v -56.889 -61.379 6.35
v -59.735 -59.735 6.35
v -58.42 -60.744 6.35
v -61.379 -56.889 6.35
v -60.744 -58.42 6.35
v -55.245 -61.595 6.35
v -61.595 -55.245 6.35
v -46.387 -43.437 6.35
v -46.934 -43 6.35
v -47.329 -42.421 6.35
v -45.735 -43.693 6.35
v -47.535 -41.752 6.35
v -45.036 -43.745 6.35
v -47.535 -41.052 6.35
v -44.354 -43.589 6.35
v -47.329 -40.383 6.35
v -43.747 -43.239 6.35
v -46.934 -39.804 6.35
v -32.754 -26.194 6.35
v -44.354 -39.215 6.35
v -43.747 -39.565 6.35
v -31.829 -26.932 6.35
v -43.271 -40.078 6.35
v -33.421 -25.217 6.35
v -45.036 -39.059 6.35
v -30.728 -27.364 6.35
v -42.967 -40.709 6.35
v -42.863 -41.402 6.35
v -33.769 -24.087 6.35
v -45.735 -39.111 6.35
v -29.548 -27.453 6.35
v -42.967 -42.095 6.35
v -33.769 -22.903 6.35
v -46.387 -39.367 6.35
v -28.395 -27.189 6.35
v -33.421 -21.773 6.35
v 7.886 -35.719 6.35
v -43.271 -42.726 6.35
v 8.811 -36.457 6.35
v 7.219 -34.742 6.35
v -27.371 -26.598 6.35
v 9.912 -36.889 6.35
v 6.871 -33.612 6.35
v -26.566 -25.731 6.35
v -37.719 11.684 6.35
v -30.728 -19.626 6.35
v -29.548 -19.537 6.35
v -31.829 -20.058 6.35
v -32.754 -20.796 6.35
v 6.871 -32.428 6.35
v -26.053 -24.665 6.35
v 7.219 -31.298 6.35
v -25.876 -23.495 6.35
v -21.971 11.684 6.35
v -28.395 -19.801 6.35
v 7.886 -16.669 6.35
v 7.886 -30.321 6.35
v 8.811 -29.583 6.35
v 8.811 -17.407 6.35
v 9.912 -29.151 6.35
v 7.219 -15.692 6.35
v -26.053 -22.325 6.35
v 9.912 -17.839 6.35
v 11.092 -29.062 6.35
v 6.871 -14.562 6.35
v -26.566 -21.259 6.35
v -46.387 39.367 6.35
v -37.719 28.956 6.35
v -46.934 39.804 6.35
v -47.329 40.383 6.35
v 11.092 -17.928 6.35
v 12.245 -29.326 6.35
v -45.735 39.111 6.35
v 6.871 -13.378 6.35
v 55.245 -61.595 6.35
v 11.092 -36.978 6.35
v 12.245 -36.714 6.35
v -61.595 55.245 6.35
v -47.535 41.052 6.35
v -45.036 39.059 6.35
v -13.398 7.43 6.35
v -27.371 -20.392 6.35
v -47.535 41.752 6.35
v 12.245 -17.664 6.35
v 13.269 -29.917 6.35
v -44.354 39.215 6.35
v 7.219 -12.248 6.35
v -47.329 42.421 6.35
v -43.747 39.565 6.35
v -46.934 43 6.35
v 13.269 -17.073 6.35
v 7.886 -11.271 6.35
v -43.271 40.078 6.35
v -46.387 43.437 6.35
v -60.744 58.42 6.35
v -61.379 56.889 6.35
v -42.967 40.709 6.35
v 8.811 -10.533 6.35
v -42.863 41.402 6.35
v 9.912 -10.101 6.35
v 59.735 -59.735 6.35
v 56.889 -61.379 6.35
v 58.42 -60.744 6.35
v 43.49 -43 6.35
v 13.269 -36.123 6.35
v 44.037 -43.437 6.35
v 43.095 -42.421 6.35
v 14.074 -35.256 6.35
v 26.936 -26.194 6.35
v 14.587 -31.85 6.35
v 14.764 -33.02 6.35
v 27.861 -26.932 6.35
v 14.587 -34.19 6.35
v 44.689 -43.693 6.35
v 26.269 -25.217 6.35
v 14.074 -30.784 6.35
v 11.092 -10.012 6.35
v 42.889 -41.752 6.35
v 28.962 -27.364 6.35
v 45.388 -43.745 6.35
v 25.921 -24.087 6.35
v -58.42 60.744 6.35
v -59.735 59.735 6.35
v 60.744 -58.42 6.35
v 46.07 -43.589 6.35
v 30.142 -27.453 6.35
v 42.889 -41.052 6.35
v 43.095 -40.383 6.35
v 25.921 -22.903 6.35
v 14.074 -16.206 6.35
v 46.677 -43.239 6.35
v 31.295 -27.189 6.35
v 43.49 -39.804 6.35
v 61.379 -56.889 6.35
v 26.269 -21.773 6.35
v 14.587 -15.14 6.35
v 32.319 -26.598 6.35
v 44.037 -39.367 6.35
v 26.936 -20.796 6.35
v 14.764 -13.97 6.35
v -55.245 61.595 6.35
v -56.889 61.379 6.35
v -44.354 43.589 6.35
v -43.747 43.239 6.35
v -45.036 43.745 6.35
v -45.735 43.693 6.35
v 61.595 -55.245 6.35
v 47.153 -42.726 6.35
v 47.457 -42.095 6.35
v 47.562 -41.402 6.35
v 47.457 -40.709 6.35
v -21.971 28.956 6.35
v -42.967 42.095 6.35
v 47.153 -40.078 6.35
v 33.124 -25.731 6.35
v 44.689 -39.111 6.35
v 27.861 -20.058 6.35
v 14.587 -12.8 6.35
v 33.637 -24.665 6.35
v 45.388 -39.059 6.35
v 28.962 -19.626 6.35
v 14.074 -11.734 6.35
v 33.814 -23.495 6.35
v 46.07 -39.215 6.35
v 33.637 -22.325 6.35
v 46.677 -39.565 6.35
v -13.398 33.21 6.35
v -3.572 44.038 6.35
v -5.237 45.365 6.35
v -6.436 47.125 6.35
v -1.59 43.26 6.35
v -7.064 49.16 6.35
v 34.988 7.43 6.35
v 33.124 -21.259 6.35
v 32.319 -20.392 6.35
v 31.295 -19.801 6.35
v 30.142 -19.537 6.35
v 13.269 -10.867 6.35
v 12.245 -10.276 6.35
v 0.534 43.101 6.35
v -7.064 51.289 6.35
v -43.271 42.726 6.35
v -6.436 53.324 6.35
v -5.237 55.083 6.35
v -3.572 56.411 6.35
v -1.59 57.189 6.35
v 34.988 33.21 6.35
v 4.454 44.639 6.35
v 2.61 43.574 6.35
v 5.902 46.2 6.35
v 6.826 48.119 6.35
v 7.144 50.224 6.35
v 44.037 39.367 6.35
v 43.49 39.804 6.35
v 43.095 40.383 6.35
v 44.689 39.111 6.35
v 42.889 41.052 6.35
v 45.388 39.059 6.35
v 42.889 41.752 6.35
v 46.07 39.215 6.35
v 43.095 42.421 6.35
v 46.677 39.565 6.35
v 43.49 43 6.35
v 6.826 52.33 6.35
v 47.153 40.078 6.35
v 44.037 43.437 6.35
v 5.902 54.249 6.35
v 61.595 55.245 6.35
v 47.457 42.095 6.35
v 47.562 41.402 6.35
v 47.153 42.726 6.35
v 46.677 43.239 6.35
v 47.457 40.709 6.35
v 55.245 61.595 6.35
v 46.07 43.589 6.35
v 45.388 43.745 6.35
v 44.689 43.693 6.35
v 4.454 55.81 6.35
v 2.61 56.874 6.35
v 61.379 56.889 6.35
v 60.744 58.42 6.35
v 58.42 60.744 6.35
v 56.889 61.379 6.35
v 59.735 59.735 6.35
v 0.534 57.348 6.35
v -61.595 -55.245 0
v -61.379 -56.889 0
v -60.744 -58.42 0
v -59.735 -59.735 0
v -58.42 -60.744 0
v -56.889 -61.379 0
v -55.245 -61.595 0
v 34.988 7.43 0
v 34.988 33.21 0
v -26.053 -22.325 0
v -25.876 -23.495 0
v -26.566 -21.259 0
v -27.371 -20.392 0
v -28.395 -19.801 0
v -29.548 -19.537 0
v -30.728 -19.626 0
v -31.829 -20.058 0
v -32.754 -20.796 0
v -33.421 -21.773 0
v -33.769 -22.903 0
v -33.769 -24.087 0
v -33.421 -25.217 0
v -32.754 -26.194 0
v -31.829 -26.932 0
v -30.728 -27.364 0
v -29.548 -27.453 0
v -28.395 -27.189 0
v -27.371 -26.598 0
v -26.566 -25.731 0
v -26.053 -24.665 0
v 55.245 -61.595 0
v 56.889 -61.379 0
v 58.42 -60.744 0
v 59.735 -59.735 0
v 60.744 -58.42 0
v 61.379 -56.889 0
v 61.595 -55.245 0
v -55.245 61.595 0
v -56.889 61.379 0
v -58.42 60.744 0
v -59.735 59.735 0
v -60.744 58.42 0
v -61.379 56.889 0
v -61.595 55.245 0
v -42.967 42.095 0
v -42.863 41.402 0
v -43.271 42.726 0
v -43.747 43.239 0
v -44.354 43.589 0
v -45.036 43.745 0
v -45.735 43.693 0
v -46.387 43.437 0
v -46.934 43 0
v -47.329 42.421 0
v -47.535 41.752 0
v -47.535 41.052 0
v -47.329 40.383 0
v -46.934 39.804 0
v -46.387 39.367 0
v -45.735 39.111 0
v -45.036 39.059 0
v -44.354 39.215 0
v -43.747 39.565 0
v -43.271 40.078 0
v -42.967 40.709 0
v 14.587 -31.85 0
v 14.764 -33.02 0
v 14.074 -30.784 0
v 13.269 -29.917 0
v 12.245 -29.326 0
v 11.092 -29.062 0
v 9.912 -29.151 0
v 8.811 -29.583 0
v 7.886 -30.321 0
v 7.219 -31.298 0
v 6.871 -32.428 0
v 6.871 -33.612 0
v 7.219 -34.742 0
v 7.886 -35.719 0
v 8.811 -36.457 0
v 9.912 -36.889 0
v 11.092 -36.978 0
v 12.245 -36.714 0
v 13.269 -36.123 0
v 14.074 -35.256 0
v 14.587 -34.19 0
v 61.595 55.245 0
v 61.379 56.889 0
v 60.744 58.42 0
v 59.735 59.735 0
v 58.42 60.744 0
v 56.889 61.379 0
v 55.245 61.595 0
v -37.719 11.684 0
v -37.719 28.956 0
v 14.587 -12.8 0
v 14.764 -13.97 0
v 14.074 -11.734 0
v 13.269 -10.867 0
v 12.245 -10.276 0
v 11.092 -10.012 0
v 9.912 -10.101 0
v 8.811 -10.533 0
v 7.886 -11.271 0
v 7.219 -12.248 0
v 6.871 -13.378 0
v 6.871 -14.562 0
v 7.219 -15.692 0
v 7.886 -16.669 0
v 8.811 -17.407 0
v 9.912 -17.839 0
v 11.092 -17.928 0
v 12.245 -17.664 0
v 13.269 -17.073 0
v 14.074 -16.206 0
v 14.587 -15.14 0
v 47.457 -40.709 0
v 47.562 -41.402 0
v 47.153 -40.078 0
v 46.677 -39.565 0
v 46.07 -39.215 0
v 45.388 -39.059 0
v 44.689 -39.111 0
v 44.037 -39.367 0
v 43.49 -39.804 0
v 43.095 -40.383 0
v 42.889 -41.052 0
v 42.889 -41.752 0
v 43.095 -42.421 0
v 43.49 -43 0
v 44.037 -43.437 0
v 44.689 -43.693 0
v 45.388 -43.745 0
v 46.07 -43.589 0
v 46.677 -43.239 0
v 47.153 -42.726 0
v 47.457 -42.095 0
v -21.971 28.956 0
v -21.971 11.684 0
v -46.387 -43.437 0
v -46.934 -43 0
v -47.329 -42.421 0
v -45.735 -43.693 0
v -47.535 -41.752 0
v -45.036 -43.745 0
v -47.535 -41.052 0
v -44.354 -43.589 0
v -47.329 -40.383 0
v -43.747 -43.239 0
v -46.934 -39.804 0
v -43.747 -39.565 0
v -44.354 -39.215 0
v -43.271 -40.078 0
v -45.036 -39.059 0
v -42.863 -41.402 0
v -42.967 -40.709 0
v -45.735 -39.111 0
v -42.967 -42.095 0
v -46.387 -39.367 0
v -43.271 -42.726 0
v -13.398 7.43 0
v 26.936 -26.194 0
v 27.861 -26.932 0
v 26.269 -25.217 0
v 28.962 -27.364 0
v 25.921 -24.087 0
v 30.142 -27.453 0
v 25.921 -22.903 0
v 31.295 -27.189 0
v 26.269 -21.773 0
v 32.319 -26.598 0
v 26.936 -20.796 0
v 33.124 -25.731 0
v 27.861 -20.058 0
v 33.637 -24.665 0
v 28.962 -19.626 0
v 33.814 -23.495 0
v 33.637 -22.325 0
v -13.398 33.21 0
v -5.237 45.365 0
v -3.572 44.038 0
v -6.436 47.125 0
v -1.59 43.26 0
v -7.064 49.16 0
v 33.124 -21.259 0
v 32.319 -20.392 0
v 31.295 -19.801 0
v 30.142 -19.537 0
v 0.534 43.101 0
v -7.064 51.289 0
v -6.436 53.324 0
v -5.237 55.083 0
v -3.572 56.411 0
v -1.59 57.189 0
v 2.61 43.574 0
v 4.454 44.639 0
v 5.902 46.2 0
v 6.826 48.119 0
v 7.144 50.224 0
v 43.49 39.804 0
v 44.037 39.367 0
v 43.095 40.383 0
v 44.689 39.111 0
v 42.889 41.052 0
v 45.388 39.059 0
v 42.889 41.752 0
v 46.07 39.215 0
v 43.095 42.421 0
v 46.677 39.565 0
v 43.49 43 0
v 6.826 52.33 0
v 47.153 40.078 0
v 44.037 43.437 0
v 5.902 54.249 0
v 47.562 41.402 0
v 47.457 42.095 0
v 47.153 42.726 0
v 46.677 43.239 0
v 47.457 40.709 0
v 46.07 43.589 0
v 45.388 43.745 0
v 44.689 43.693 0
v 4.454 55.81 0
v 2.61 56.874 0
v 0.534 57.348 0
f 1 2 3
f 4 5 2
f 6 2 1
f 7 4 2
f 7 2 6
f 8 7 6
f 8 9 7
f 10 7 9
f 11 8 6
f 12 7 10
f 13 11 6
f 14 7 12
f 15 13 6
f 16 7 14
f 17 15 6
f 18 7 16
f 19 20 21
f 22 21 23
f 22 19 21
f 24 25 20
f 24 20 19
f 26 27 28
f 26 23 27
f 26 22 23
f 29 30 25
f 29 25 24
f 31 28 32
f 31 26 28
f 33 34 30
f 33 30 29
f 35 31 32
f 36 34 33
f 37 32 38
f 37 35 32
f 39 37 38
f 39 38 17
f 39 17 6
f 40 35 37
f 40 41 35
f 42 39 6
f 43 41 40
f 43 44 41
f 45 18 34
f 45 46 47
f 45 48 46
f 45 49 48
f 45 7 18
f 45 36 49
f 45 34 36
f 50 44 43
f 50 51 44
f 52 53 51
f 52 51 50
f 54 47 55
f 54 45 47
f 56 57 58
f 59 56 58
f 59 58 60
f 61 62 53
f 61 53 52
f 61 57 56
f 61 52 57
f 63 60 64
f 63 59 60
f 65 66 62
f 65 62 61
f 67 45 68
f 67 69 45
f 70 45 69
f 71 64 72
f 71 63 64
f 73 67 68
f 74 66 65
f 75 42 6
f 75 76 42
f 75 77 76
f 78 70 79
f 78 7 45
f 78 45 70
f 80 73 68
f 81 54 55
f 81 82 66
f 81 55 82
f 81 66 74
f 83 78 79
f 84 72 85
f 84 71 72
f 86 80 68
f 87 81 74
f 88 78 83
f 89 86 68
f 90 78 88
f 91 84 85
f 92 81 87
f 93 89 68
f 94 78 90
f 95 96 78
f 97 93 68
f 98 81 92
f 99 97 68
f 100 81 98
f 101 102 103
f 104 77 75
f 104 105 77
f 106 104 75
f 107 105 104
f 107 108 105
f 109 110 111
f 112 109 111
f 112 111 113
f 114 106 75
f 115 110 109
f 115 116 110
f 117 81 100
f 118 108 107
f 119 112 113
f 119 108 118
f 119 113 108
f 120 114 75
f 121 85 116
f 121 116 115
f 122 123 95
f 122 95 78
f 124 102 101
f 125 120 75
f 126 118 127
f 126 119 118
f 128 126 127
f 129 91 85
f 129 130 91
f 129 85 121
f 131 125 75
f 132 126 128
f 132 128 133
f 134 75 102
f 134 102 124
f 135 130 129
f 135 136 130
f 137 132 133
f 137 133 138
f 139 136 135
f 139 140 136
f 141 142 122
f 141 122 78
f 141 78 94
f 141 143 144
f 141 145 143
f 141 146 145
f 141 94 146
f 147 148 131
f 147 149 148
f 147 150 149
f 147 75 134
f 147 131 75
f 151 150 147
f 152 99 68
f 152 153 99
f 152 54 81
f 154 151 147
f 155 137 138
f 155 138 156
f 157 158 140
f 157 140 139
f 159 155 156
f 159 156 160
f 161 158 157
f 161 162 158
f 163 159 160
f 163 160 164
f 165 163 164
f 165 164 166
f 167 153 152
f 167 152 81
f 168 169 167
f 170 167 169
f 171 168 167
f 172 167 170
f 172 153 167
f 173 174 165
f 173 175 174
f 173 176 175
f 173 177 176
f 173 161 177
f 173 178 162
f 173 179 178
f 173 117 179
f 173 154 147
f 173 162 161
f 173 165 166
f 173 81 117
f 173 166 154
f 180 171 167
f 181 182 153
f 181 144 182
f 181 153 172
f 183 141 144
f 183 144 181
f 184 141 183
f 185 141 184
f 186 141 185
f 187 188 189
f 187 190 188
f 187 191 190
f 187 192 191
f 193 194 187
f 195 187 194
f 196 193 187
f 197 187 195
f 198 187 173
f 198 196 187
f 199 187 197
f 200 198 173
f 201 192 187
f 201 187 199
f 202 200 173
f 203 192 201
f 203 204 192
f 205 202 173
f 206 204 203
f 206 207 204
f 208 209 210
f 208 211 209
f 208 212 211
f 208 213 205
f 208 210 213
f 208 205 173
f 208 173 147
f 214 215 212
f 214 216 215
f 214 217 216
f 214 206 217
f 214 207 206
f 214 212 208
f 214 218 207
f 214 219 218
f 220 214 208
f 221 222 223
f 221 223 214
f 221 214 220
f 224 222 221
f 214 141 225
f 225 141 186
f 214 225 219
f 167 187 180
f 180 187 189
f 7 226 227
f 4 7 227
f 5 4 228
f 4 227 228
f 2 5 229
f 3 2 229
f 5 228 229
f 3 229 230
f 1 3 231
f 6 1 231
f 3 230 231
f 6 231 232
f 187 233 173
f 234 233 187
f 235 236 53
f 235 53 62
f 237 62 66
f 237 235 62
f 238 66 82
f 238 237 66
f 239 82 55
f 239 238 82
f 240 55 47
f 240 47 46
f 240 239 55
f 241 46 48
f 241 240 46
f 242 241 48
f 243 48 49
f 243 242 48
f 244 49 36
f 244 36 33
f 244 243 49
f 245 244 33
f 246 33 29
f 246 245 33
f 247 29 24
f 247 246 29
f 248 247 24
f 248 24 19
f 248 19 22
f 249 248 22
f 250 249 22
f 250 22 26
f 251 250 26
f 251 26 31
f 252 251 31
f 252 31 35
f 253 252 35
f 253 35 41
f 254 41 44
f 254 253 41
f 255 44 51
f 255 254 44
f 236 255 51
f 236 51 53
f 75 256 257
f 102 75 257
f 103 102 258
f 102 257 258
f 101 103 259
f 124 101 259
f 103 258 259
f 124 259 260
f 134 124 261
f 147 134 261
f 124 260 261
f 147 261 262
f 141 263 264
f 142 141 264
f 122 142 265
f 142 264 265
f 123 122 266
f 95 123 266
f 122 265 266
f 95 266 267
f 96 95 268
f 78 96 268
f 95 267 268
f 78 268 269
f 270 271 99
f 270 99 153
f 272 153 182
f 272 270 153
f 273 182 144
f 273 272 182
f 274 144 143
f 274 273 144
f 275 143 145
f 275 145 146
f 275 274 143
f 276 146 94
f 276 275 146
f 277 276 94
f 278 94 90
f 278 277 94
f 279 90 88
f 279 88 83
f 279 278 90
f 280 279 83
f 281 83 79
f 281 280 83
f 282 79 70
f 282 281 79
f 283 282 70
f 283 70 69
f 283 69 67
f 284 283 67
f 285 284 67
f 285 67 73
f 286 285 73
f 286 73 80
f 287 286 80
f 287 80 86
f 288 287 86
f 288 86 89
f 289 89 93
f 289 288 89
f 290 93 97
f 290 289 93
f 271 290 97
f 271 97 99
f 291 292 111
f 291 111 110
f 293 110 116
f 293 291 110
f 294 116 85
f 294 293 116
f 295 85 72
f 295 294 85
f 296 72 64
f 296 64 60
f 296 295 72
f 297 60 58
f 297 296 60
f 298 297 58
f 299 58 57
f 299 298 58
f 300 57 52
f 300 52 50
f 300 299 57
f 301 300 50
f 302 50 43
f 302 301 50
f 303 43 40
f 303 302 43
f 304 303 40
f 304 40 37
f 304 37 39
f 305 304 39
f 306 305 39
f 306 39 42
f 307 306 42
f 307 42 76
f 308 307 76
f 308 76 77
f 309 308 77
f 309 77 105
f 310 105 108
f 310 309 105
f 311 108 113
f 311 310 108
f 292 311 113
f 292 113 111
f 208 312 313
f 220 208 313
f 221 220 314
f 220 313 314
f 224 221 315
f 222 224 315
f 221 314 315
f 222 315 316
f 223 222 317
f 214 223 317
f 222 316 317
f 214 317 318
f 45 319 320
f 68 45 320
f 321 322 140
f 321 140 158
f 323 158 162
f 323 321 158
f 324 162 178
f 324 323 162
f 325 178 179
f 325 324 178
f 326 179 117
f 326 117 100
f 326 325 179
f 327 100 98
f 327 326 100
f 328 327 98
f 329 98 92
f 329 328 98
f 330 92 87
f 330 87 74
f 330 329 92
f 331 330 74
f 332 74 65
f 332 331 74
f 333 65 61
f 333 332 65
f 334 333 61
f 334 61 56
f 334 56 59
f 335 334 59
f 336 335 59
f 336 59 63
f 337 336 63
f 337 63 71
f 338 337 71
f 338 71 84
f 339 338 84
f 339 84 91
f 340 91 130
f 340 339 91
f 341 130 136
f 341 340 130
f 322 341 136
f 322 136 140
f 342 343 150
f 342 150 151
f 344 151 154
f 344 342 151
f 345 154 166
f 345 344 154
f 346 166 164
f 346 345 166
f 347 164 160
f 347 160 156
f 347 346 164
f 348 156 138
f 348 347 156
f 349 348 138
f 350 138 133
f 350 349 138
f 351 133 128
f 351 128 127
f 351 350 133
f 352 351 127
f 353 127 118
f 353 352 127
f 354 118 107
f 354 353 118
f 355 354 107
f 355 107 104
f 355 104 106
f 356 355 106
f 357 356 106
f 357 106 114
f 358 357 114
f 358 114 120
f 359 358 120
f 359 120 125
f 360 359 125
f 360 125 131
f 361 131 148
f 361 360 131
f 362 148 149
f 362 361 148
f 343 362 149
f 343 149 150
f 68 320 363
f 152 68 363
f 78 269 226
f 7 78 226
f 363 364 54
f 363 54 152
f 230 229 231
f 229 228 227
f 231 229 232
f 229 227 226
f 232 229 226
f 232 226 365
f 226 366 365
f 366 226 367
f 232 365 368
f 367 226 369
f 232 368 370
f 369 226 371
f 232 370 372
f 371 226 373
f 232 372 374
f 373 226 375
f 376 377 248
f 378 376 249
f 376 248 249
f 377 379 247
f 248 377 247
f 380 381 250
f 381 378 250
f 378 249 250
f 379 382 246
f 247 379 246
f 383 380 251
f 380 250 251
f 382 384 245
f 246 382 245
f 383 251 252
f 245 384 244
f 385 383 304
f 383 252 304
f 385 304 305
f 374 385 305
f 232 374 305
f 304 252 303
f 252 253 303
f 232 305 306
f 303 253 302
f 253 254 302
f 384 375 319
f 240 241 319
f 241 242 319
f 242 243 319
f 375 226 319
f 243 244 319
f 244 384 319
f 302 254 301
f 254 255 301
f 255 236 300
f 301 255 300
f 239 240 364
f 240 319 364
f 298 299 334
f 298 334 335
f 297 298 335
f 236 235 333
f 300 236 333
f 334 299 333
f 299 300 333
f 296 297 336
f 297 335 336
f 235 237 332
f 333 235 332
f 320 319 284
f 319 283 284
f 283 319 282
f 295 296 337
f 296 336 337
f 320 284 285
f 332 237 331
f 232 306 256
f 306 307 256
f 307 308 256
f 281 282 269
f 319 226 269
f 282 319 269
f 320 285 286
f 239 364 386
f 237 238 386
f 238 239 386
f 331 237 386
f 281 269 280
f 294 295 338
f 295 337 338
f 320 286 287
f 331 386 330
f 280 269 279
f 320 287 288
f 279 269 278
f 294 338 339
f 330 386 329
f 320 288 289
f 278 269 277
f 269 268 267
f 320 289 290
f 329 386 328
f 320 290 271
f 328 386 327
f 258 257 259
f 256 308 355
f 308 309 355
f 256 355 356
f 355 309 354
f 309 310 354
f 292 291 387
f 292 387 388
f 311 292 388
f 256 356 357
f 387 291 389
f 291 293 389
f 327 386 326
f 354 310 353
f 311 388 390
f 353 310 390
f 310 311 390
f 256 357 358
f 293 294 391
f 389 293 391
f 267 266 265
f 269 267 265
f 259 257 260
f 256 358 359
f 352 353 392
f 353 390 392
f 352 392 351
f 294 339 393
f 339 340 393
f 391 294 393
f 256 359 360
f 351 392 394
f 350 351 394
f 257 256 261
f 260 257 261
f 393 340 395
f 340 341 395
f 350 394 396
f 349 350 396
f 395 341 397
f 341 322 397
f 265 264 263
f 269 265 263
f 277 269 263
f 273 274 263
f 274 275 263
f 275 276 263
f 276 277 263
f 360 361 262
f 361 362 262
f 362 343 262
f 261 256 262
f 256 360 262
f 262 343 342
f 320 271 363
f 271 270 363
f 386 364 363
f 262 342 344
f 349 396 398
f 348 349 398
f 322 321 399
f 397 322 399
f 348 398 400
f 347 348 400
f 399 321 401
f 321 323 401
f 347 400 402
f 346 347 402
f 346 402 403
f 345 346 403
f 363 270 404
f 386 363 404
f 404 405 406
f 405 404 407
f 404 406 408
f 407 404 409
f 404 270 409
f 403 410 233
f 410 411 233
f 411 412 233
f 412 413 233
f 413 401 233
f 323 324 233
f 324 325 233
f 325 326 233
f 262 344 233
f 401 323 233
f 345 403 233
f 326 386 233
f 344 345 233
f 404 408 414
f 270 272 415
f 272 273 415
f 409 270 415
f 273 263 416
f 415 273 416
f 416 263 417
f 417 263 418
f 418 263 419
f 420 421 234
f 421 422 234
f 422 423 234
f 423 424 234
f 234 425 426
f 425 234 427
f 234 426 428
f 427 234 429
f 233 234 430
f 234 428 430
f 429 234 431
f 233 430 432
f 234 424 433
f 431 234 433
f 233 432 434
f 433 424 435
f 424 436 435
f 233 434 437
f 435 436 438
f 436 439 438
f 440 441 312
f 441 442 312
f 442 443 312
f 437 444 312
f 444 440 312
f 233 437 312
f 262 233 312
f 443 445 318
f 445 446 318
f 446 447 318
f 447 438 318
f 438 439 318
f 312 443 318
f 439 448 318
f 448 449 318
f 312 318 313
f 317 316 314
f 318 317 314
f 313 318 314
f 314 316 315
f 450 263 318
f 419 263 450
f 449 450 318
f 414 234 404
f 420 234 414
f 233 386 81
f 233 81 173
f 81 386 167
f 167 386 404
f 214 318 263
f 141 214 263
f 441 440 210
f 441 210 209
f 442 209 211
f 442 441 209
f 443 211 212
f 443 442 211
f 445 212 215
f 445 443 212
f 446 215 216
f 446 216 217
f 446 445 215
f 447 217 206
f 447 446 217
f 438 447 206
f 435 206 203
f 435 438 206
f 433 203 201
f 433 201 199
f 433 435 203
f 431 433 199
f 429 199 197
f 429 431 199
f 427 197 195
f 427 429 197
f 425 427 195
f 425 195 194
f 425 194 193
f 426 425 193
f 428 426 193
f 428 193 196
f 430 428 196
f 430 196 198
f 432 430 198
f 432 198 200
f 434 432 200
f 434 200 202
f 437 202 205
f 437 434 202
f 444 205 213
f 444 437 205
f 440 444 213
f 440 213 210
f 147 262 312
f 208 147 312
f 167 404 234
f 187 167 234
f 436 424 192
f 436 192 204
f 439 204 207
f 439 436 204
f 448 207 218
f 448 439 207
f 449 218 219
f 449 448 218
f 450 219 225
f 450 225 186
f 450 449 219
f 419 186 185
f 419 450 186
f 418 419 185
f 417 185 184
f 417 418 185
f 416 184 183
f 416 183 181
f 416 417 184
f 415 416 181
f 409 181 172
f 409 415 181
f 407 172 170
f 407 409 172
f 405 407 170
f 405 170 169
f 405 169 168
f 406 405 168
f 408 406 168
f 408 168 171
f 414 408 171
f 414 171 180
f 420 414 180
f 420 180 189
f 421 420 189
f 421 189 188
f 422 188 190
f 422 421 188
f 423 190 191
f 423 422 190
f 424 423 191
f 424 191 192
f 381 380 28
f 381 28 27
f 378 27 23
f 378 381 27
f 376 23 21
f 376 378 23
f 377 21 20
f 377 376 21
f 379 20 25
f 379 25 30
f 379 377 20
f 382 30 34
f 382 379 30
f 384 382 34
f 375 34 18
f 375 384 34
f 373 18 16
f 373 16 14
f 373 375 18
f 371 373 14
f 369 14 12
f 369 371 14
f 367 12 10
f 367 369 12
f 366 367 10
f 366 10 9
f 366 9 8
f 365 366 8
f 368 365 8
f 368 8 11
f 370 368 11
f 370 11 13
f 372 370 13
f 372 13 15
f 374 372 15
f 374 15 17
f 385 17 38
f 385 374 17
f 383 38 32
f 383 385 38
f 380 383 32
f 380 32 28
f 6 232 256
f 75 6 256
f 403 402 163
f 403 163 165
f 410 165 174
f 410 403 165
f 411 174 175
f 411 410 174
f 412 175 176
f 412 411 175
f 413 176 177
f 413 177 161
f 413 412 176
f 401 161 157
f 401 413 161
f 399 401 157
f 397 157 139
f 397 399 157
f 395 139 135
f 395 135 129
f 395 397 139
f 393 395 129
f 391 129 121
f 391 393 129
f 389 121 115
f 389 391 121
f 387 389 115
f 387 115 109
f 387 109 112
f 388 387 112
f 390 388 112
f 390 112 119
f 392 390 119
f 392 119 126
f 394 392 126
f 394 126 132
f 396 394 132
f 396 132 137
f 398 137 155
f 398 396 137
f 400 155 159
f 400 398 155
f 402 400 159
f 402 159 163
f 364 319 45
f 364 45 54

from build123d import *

# Parameters (mm, degrees)
F0_R     = 2.3495
F0_R_2   = 3.96875
F0_W     = 15.748
F0_H     = 17.272
F0_W_2   = 48.387
F0_H_2   = 25.781
F0_R_3   = 7.14375
F1_DEPTH = 6.35


with BuildPart() as f1:
    # F0 (on Top) → F1 (new body)
    with BuildSketch(Plane.XY):
        with BuildLine():
            ThreePointArc((61.595, 55.245), (59.735128, 59.735128), (55.245, 61.595))
            Line((55.245, 61.595), (-55.245, 61.595))
            ThreePointArc((-55.245, 61.595), (-59.735128, 59.735128), (-61.595, 55.245))
            Line((-61.595, 55.245), (-61.595, -55.245))
            ThreePointArc((-61.595, -55.245), (-59.735128, -59.735128), (-55.245, -61.595))
            Line((-55.245, -61.595), (55.245, -61.595))
            ThreePointArc((55.245, -61.595), (59.735128, -59.735128), (61.595, -55.245))
            Line((61.595, -55.245), (61.595, 55.245))
        make_face()
        with Locations((-45.212, -41.402)):
            Circle(F0_R, mode=Mode.SUBTRACT)
        with Locations((-29.845, -23.495)):
            Circle(F0_R_2, mode=Mode.SUBTRACT)
        with Locations((10.795, -33.02)):
            Circle(F0_R_2, mode=Mode.SUBTRACT)
        with Locations((45.212, -41.402)):
            Circle(F0_R, mode=Mode.SUBTRACT)
        with Locations((29.845, -23.495)):
            Circle(F0_R_2, mode=Mode.SUBTRACT)
        with Locations((10.795, -13.97)):
            Circle(F0_R_2, mode=Mode.SUBTRACT)
        with Locations((-29.845, 20.32)):
            Rectangle(F0_W, F0_H, mode=Mode.SUBTRACT)
        with Locations((-45.212, 41.402)):
            Circle(F0_R, mode=Mode.SUBTRACT)
        with Locations((10.795, 20.32)):
            Rectangle(F0_W_2, F0_H_2, mode=Mode.SUBTRACT)
        with Locations((0, 50.224401)):
            Circle(F0_R_3, mode=Mode.SUBTRACT)
        with Locations((45.212, 41.402)):
            Circle(F0_R, mode=Mode.SUBTRACT)
    extrude(amount=F1_DEPTH)


solid = f1.part
